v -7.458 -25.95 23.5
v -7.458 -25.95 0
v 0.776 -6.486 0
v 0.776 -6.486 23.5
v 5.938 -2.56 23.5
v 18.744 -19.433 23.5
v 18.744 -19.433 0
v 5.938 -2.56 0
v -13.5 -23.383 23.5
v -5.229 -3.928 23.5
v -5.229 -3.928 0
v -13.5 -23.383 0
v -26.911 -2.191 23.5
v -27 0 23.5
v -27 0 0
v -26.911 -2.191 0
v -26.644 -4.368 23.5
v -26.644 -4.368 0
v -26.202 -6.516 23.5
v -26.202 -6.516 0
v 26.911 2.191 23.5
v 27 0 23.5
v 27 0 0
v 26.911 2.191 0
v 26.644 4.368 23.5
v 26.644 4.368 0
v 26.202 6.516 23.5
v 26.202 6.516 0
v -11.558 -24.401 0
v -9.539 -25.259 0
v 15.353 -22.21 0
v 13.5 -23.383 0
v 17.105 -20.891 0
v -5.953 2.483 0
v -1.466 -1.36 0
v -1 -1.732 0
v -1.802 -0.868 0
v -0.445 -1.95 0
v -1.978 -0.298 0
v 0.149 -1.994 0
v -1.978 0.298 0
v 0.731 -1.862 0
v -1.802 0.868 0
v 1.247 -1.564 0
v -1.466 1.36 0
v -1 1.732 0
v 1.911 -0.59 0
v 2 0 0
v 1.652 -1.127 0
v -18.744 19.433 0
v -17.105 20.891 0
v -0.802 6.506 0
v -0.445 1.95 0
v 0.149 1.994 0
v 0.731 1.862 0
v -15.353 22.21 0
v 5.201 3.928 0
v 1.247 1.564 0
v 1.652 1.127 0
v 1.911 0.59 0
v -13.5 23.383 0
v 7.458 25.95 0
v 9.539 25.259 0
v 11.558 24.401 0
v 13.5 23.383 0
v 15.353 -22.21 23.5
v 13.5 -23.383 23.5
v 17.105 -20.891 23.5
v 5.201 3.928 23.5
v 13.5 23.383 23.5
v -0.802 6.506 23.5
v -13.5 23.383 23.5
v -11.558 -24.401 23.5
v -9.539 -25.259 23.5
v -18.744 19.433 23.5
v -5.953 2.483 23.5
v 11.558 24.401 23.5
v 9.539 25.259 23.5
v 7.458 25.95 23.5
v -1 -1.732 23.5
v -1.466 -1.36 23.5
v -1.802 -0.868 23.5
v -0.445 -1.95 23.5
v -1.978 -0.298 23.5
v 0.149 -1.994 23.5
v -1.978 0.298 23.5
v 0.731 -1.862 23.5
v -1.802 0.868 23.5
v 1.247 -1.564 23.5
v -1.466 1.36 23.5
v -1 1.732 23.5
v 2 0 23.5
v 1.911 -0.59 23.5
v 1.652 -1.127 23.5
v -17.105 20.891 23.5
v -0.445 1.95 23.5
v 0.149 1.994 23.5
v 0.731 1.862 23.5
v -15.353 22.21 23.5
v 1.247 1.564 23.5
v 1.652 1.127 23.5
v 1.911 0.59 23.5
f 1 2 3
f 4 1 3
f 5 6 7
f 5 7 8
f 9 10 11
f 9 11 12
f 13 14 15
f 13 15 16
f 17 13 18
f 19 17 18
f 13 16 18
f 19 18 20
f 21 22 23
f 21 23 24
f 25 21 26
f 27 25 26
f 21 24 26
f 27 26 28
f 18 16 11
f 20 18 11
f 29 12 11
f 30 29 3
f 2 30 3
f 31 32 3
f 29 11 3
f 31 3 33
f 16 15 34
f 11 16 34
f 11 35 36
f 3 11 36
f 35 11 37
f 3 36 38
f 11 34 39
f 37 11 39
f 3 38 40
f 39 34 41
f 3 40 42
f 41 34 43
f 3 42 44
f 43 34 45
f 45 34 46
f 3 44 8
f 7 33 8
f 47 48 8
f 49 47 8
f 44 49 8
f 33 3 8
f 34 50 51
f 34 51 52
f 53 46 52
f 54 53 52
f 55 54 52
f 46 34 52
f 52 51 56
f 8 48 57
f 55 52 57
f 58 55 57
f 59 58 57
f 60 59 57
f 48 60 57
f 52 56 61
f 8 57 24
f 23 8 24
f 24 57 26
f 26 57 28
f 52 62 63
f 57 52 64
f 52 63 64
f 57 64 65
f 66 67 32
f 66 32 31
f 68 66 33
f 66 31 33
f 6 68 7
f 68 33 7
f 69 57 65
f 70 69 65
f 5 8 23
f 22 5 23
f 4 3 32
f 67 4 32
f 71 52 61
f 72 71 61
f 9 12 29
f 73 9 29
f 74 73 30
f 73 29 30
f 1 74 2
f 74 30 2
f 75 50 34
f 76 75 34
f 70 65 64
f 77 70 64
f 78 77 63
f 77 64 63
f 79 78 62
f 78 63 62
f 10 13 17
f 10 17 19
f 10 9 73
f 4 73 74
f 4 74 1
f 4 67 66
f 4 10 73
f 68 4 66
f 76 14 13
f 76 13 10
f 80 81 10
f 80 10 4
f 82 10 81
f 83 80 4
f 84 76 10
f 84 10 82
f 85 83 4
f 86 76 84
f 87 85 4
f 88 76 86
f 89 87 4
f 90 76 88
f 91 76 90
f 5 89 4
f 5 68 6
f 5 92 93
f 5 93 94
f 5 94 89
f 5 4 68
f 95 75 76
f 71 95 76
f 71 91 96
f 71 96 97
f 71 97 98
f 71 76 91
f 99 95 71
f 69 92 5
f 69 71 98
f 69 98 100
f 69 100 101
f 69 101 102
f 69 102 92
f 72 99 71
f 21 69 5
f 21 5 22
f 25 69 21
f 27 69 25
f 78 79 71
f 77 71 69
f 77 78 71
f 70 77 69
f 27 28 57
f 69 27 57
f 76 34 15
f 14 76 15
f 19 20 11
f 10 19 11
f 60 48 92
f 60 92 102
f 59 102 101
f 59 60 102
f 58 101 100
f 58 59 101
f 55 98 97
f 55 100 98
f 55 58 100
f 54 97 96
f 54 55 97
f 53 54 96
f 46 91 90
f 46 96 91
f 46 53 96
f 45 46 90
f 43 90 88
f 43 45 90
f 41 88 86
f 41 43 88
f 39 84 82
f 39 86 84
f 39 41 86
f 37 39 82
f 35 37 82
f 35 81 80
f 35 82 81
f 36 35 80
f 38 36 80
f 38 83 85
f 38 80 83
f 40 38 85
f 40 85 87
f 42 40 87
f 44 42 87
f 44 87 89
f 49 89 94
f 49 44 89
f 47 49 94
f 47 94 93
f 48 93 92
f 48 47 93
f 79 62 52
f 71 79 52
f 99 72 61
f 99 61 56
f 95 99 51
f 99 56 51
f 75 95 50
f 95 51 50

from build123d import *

# Parameters (mm, degrees)
EXTRUDE_1_DEPTH          = 23.5
CUT_EXTRUDE_1_DEPTH      = 45.211198656
CUT_EXTRUDE_1_DEPTH_BACK = 45.211198656
SKETCH_2_R               = 2


with BuildPart() as part:
    # 草图1 → 凸台-拉伸1 (new body)
    with BuildSketch(Plane.XY):
        with BuildLine():
            Line((-18.74404726, 19.433494084), (-5.953134221, 2.483458779))
            Line((-5.953134221, 2.483458779), (-27, 0))
            ThreePointArc((-27, 0), (-26.799738116, -3.282382812), (-26.201923191, -6.516074055))
            Line((-26.201923191, -6.516074055), (-5.228535388, -3.928299208))
            Line((-5.228535388, -3.928299208), (-13.5, -23.382685902))
            ThreePointArc((-13.5, -23.382685902), (-10.557242158, -24.850445429), (-7.457875931, -25.949568139))
            Line((-7.457875931, -25.949568139), (0.77550929, -6.485913341))
            Line((0.77550929, -6.485913341), (13.5, -23.382685902))
            ThreePointArc((13.5, -23.382685902), (16.242495958, -21.568062617), (18.74404726, -19.433494084))
            Line((18.74404726, -19.433494084), (5.938212824, -2.560395934))
            Line((5.938212824, -2.560395934), (27, 0))
            ThreePointArc((27, 0), (26.799738116, 3.282382812), (26.201923191, 6.516074055))
            Line((26.201923191, 6.516074055), (5.200951411, 3.927966656))
            Line((5.200951411, 3.927966656), (13.5, 23.382685902))
            ThreePointArc((13.5, 23.382685902), (10.557242158, 24.850445429), (7.457875931, 25.949568139))
            Line((7.457875931, 25.949568139), (-0.802395418, 6.505702023))
            Line((-0.802395418, 6.505702023), (-13.5, 23.382685902))
            ThreePointArc((-13.5, 23.382685902), (-16.242495958, 21.568062617), (-18.74404726, 19.433494084))
        make_face()
    extrude(amount=EXTRUDE_1_DEPTH)

    # 草图2 → 切除-拉伸1 (cut, two sides: drawn at the far end of the back side and taken through both)
    with BuildSketch(Plane.XY.offset(23.5).offset(-CUT_EXTRUDE_1_DEPTH_BACK)):
        Circle(SKETCH_2_R)
    extrude(amount=CUT_EXTRUDE_1_DEPTH + CUT_EXTRUDE_1_DEPTH_BACK, mode=Mode.SUBTRACT)


solid = part.part
